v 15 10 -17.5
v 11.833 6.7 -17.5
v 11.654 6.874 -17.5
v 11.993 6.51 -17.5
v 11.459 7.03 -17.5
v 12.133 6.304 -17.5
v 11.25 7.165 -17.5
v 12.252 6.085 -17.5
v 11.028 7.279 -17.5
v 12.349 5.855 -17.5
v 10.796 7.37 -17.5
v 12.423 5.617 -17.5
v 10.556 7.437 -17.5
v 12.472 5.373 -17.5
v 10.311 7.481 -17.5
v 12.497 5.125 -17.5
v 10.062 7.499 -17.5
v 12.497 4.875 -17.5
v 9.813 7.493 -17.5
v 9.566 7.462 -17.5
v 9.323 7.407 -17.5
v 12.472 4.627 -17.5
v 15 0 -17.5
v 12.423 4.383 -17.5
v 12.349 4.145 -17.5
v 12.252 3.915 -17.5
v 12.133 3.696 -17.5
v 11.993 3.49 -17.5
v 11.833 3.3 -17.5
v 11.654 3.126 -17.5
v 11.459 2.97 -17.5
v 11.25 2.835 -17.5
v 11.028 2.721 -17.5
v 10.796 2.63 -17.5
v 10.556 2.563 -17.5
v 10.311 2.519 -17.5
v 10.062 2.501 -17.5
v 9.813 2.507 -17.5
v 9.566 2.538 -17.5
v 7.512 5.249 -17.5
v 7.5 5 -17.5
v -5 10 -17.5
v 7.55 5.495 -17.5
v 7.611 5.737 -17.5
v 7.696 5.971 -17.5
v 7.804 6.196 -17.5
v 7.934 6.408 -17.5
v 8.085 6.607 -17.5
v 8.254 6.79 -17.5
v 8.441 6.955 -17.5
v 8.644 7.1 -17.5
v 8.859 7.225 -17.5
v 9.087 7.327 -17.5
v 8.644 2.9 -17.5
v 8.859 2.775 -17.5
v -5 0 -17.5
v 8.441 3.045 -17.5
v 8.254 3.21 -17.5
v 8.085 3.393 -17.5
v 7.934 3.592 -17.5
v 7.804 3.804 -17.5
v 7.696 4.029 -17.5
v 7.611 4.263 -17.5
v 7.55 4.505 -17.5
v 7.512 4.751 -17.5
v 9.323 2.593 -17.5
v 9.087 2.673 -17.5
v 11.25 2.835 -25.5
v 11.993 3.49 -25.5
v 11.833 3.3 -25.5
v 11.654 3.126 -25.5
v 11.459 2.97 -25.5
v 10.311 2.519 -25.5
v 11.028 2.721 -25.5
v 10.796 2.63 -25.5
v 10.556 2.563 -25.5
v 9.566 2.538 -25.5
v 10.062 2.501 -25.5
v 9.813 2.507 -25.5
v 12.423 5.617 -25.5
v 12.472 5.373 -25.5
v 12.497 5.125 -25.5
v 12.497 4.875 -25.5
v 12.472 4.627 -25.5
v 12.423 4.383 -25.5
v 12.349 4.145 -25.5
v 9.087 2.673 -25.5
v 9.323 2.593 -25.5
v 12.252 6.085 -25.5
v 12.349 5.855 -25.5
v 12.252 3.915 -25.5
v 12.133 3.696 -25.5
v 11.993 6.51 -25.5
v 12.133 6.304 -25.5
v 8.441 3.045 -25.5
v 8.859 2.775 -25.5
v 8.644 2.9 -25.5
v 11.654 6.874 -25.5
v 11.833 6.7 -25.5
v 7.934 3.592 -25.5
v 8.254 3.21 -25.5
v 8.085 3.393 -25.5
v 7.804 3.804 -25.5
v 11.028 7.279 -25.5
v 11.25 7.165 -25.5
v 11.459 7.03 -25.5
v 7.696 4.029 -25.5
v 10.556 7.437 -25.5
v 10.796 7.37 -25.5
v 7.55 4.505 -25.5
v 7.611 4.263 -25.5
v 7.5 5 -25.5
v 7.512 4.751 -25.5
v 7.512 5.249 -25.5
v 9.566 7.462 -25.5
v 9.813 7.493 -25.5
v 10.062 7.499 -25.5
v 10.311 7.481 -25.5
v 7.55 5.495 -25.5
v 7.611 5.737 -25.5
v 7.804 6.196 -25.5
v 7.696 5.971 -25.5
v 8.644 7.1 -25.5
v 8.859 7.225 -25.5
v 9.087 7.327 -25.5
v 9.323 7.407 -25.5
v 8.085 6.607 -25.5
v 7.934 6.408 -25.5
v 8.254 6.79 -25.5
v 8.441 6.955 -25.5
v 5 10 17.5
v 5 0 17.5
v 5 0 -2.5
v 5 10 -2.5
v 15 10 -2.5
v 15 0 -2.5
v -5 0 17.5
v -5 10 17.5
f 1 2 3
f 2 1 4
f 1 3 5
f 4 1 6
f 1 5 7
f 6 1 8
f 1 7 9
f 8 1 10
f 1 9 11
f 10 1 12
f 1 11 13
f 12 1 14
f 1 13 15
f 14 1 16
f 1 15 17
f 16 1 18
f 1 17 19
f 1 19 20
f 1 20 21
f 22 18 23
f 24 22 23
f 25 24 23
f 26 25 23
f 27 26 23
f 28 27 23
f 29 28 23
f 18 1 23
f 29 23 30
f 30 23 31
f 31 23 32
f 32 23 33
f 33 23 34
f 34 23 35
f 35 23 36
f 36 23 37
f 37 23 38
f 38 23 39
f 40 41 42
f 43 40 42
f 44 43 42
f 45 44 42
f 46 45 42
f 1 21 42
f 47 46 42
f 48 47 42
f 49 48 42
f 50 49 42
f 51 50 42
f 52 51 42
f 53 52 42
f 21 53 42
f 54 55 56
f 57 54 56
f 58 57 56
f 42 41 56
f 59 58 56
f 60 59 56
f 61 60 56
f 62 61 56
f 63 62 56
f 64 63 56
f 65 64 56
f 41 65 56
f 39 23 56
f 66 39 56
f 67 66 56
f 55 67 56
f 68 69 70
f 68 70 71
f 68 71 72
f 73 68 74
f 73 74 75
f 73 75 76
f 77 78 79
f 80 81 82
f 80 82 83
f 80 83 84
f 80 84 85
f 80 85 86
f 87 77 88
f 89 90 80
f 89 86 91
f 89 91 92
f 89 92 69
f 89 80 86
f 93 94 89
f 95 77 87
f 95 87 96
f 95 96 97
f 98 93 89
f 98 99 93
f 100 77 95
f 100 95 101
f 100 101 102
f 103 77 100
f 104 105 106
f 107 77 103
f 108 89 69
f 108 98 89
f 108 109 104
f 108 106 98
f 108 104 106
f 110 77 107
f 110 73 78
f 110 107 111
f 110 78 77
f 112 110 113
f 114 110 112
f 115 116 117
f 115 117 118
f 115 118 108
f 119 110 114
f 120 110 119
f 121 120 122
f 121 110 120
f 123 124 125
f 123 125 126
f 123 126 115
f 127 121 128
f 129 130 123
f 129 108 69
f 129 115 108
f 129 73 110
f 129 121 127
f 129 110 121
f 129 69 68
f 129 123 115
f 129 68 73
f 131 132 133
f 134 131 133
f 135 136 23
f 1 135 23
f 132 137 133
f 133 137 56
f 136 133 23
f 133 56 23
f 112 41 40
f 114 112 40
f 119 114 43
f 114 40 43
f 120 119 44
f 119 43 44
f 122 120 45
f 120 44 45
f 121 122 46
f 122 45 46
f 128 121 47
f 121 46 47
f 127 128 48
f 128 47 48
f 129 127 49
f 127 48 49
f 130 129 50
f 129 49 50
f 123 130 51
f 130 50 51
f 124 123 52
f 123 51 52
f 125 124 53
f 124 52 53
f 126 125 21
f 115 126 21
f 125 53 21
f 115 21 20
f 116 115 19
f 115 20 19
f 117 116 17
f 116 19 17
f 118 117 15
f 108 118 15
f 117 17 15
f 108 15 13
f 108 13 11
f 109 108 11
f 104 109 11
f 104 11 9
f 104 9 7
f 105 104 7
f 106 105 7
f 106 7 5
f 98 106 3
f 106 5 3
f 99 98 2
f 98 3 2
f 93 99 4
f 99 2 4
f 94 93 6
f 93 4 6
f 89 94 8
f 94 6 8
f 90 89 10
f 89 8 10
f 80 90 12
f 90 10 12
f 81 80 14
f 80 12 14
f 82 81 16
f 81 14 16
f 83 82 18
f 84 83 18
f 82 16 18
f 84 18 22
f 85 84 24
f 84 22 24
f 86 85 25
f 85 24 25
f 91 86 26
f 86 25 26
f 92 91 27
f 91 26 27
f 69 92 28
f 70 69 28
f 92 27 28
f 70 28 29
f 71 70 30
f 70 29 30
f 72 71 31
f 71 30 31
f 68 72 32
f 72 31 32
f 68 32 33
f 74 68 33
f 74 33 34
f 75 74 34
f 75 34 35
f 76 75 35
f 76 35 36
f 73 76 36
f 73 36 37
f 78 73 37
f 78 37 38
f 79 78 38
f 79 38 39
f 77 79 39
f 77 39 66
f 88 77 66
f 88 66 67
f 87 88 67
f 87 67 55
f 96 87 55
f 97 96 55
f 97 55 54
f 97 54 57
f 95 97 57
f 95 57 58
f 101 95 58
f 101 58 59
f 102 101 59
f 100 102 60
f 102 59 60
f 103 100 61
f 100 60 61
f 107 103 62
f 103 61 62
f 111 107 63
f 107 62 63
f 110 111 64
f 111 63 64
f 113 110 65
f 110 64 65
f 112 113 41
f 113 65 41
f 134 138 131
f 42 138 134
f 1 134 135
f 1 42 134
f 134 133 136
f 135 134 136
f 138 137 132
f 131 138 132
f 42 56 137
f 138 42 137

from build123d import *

# Parameters (mm, degrees)
BOSS_EXTRUDE1_DEPTH = 10
SKETCH2_R           = 2.5
BOSS_EXTRUDE2_DEPTH = 8


with BuildPart() as part:
    # Sketch1 → Boss-Extrude1 (new body)
    with BuildSketch(Plane(origin=(0, 0, 0), x_dir=(1, 0, 0), z_dir=(0, 1, 0))):
        Polygon((-5, -17.5), (5, -17.5), (5, 2.5), (15, 2.5), (15, 17.5), (5, 17.5), (-5, 17.5), align=None)
    extrude(amount=BOSS_EXTRUDE1_DEPTH)

    # Sketch2 → Boss-Extrude2 (add)
    with BuildSketch(Plane(origin=(0, 0, -17.5), x_dir=(-1, 0, 0), z_dir=(0, 0, -1))):
        with Locations((-10, 5)):
            Circle(SKETCH2_R)
    extrude(amount=BOSS_EXTRUDE2_DEPTH)


solid = part.part
